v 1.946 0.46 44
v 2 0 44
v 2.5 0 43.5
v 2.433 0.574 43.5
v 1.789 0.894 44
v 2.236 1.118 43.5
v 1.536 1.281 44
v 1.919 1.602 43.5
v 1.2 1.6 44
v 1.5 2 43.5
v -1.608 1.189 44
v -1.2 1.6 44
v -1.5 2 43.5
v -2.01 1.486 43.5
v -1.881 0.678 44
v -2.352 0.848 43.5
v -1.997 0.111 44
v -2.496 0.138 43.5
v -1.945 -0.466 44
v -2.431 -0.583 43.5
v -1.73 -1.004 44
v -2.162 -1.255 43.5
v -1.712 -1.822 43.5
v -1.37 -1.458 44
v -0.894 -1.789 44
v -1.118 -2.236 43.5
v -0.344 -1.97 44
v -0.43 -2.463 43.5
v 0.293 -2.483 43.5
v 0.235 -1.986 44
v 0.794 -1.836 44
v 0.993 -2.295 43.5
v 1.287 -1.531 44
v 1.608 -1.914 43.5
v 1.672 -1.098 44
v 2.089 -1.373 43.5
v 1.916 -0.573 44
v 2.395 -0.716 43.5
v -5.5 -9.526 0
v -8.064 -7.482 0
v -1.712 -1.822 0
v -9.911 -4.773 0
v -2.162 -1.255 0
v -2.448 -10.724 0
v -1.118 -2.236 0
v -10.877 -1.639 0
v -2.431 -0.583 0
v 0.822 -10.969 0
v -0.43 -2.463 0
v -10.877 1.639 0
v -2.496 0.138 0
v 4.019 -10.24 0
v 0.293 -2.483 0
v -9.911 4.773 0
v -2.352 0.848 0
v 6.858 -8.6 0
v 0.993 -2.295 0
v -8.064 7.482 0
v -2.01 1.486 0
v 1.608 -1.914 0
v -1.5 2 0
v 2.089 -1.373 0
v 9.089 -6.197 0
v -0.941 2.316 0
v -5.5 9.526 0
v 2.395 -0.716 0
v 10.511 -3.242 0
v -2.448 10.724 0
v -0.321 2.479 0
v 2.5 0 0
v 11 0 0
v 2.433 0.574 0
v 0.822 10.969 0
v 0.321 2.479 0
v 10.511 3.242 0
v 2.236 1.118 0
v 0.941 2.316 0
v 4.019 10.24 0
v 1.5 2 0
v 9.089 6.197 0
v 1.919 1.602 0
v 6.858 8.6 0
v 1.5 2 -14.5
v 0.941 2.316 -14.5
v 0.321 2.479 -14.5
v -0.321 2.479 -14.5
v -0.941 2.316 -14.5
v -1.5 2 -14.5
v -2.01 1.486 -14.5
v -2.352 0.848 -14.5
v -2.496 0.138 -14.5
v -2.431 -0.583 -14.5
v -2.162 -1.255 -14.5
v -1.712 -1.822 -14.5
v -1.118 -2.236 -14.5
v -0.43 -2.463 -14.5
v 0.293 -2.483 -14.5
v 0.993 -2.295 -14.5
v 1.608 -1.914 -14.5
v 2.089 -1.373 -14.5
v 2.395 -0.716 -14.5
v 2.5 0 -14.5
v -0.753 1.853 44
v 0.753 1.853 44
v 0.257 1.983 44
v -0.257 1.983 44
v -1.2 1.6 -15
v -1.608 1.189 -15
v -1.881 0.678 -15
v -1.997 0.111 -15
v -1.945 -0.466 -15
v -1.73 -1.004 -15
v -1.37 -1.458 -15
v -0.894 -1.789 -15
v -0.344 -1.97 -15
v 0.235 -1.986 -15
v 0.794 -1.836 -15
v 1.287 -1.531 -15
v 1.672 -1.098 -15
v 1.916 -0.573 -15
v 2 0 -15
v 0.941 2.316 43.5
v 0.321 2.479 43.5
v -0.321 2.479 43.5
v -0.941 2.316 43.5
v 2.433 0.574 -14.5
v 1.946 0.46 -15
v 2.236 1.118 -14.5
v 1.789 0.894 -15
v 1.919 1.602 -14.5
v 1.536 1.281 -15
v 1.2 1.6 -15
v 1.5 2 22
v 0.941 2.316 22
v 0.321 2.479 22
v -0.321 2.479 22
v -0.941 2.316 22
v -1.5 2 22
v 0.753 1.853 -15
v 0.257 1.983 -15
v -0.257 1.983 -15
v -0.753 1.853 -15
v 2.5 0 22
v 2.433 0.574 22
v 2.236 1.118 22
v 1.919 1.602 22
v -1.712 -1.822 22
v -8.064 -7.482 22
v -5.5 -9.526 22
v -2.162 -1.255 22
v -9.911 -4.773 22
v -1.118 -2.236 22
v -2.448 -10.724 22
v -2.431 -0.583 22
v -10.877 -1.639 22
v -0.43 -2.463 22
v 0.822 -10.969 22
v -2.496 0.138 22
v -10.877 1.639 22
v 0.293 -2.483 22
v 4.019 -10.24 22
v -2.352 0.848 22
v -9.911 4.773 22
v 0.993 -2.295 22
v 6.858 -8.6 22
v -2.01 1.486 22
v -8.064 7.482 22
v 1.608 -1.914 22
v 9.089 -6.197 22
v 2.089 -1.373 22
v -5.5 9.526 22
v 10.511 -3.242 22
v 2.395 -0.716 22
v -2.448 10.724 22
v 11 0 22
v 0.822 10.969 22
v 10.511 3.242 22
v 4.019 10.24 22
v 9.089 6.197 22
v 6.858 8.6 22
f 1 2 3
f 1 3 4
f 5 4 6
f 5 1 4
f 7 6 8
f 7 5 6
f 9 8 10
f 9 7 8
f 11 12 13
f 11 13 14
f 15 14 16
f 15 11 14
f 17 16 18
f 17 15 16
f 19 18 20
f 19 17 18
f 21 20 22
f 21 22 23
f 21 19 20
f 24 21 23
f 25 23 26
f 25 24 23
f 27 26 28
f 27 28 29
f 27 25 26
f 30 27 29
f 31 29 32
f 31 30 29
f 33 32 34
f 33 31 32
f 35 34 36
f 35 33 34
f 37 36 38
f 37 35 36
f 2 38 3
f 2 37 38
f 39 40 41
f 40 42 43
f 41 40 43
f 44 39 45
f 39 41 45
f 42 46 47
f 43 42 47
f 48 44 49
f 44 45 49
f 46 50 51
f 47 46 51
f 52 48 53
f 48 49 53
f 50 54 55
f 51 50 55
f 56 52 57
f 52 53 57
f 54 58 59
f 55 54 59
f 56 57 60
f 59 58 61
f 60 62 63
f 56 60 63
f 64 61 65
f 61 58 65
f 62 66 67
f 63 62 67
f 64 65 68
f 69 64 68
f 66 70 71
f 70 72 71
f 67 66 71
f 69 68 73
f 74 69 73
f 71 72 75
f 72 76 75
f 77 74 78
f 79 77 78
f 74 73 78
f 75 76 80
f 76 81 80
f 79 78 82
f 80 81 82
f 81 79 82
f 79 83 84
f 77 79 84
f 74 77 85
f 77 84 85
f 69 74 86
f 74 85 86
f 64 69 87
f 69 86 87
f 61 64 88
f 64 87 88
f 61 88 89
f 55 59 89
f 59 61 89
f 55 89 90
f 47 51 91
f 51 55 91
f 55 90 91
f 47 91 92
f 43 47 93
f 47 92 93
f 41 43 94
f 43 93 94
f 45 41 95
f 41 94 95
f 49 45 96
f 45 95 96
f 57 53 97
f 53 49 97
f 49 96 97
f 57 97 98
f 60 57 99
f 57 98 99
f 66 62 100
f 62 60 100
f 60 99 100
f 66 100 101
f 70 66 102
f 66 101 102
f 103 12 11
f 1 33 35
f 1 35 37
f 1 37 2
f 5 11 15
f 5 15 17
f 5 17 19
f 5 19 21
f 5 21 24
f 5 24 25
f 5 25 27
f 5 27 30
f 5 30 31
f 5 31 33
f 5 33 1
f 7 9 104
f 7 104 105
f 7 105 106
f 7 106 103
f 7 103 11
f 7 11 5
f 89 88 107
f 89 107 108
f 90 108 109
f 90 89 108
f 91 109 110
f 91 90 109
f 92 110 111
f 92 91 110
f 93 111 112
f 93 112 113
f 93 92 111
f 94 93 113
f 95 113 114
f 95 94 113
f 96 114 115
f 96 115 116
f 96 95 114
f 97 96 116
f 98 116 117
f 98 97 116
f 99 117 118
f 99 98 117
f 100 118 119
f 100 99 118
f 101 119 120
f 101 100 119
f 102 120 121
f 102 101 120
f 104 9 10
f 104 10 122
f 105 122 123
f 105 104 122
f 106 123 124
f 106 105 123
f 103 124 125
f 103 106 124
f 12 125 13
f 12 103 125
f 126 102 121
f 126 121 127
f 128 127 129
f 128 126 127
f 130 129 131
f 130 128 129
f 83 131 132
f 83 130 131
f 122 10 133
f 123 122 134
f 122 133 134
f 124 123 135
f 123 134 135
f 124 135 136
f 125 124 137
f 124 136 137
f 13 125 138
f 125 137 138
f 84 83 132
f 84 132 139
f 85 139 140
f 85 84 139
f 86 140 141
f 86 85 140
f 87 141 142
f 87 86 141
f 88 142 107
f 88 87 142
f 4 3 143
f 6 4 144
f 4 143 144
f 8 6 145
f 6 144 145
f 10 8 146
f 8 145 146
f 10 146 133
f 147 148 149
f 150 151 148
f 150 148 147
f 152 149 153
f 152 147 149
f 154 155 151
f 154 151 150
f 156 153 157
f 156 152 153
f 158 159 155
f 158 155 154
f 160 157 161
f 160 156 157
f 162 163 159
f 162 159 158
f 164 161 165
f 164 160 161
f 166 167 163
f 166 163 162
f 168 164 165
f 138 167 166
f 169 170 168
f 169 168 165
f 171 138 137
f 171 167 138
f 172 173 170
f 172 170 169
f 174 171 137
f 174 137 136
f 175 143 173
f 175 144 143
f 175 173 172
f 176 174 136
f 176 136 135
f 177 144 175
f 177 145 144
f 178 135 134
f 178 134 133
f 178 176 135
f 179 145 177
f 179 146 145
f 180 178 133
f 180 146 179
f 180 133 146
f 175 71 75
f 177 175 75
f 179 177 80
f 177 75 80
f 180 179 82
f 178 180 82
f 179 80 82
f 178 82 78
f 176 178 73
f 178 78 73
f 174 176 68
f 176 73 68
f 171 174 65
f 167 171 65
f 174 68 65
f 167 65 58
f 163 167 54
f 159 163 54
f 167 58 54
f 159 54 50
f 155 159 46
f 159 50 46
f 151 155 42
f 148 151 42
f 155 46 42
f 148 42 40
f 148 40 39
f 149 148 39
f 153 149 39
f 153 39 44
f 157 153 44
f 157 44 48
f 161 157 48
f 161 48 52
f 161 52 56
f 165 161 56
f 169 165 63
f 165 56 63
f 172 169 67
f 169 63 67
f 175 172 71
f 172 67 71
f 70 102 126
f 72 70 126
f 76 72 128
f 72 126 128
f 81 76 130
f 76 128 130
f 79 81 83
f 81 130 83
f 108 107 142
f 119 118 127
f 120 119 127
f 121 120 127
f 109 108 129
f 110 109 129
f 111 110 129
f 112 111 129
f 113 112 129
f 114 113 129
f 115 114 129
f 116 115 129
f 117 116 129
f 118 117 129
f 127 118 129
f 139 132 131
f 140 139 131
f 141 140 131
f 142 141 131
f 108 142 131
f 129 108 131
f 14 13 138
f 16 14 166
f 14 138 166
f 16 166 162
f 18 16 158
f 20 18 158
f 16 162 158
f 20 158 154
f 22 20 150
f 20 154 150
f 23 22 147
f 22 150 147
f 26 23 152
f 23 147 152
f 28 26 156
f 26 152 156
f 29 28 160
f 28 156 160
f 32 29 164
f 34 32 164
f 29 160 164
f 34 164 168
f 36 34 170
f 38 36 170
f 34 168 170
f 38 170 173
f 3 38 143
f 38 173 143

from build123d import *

# Parameters (mm, degrees)
SKETCH1_R           = 11
SKETCH1_R_2         = 2.5
BOSS_EXTRUDE1_DEPTH = 22
BOSS_EXTRUDE2_START = -15
BOSS_EXTRUDE2_DEPTH = 59
CHAMFER2_SIZE       = 0.5


with BuildPart() as part:
    # Sketch1 → Boss-Extrude1 (new body)
    # profile 1 of 5: a face of its own
    with BuildSketch(Plane.XY):
        Circle(SKETCH1_R)
        Circle(SKETCH1_R_2, mode=Mode.SUBTRACT)
    # profile 2 of 5: a face of its own
    with BuildSketch(Plane.XY):
        with BuildLine():
            ThreePointArc((1.5, 2), (0, 2.5), (-1.5, 2))
            Line((-1.5, 2), (1.5, 2))
        make_face()
    # profile 3 of 5: a face of its own
    with BuildSketch(Plane.XY):
        with BuildLine():
            Line((1.5, 2), (-1.5, 2))
            ThreePointArc((-1.5, 2), (-1.118033989, -2.236067977), (2.5, 0))
            ThreePointArc((2.5, 0), (2.236067977, 1.118033989), (1.5, 2))
        make_face()
    # profile 4 of 5: a face of its own
    with BuildSketch(Plane.XY):
        with BuildLine():
            ThreePointArc((1.5, 2), (0, 2.5), (-1.5, 2))
            Line((-1.5, 2), (1.5, 2))
        make_face()
    # profile 5 of 5: a face of its own
    with BuildSketch(Plane.XY):
        with BuildLine():
            Line((1.5, 2), (-1.5, 2))
            ThreePointArc((-1.5, 2), (-1.118033989, -2.236067977), (2.5, 0))
            ThreePointArc((2.5, 0), (2.236067977, 1.118033989), (1.5, 2))
        make_face()
    extrude(amount=BOSS_EXTRUDE1_DEPTH)

    # Sketch1<3> → Boss-Extrude2 (add)
    with BuildSketch(Plane.XY.offset(BOSS_EXTRUDE2_START)):
        with BuildLine():
            ThreePointArc((1.5, 2), (0, 2.5), (-1.5, 2))
            Line((-1.5, 2), (1.5, 2))
        make_face()
        with BuildLine():
            Line((1.5, 2), (-1.5, 2))
            ThreePointArc((-1.5, 2), (-1.118033989, -2.236067977), (2.5, 0))
            ThreePointArc((2.5, 0), (2.236067977, 1.118033989), (1.5, 2))
        make_face()
    extrude(amount=BOSS_EXTRUDE2_DEPTH)

    # Chamfer2
    chamfer2_edges = [part.edges().sort_by_distance(p)[0] for p in [
        (-2.5, 0, -15),
        (-2.5, 0, 44),
    ]]
    chamfer(chamfer2_edges, length=CHAMFER2_SIZE)


solid = part.part
